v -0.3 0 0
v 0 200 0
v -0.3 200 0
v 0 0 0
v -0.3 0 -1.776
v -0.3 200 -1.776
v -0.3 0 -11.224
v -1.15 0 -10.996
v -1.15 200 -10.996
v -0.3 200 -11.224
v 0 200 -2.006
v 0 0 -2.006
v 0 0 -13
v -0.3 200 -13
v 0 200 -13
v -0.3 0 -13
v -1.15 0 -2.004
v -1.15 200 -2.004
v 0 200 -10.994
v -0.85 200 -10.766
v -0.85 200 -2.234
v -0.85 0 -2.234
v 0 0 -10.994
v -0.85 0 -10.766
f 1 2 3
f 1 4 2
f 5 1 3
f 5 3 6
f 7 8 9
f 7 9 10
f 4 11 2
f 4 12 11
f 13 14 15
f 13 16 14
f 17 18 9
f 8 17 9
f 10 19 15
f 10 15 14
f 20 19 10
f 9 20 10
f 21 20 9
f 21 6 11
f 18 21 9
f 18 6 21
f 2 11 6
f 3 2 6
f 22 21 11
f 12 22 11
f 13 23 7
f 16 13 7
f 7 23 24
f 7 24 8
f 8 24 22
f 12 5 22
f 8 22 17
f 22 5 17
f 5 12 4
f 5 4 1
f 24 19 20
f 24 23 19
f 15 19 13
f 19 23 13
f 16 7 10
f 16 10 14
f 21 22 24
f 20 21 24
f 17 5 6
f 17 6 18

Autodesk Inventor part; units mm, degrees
ref_plane "YZ Plane" through (0, 0, 0) normal (1, 0, 0) x (0, 1, 0)
ref_plane "XZ Plane" through (0, 0, 0) normal (0, 1, 0) x (-1, 0, 0)
ref_plane "XY Plane" through (0, 0, 0) normal (0, 0, 1) x (1, 0, 0)
sketch "Skizze1" plane through (0, 0, 0) normal (0, 1, 0) x (-1, 0, 0)
  line L0 (0, 0) -> (1.15, 0) construction
  line L1 (1.15, 0) -> (1.15, -13) construction
  line L2 (1.15, -13) -> (0, -13) construction
  line L3 (0, -13) -> (0, 0) construction
  line L4 (0, -6.5) -> (1.15, -6.5) construction
  line L5 (0.575, -1.85) -> (0.575, -11.15) construction
  line L6 (0.3, -1.7763) -> (1.15, -2.0041) construction
  line L7 (0.85, -2.2343) -> (0, -2.0065) construction
  line L8 (0.3, 0) -> (0.3, -1.7763)
  line L9 (0.3, -11.2237) -> (1.15, -10.9959) construction
  line L10 (0, -10.9935) -> (0.85, -10.7657) construction
  line L11 (0.3, -11.2237) -> (0.3, -13)
  line L12 (0.85, -2.2343) -> (0.85, -10.7657)
  line L13 (0, 0) -> (0.3, 0)
  line L14 (0.3, -1.7763) -> (1.15, -2.0041)
  line L15 (1.15, -10.9959) -> (0.3, -11.2237)
  line L16 (0.3, -13) -> (0, -13)
  line L17 (0, -10.9935) -> (0.85, -10.7657)
  line L18 (0.85, -2.2343) -> (0, -2.0065)
  line L19 (1.15, -2.0041) -> (1.15, -10.9959)
  line L20 (0, -2.0065) -> (0, 0)
  line L21 (0, -10.9935) -> (0, -13)
  point P0 (0.575, -6.5)
  dimension "d0" = 1.15
  dimension "d1" = 13
  dimension "d4" = 9.3
  dimension "d7" = 75
  dimension "d8" = 0.3
  dimension "d9" = 0.3
  dimension "d10" = 75
  dimension "d11" = 0.3
  dimension "d12" = 0.3
extrude "Extrusion1" add sketch "Skizze1" along normal blind 200
equation "\"Biegeradius\" = Stärke"
equation "\"BreiteBiegungsfreistellung\" = Stärke"
equation "\"TiefeBiegungsfreistellung\" = 0.5 * Stärke"
equation "\"GrößeEckenfreistellung\" = 4 * Stärke"
equation "\"MinimalRest\" = 2 * Stärke"
equation "\"Übergangsradius\" = Biegeradius"
equation "\"JacobiRadiusGröße\" = Biegeradius"
equation "\"Abstandsgröße\" = Stärke"
equation "\"Stärke\" = 0.5"
properties part number "Koffer_ankerschiene_2m"
